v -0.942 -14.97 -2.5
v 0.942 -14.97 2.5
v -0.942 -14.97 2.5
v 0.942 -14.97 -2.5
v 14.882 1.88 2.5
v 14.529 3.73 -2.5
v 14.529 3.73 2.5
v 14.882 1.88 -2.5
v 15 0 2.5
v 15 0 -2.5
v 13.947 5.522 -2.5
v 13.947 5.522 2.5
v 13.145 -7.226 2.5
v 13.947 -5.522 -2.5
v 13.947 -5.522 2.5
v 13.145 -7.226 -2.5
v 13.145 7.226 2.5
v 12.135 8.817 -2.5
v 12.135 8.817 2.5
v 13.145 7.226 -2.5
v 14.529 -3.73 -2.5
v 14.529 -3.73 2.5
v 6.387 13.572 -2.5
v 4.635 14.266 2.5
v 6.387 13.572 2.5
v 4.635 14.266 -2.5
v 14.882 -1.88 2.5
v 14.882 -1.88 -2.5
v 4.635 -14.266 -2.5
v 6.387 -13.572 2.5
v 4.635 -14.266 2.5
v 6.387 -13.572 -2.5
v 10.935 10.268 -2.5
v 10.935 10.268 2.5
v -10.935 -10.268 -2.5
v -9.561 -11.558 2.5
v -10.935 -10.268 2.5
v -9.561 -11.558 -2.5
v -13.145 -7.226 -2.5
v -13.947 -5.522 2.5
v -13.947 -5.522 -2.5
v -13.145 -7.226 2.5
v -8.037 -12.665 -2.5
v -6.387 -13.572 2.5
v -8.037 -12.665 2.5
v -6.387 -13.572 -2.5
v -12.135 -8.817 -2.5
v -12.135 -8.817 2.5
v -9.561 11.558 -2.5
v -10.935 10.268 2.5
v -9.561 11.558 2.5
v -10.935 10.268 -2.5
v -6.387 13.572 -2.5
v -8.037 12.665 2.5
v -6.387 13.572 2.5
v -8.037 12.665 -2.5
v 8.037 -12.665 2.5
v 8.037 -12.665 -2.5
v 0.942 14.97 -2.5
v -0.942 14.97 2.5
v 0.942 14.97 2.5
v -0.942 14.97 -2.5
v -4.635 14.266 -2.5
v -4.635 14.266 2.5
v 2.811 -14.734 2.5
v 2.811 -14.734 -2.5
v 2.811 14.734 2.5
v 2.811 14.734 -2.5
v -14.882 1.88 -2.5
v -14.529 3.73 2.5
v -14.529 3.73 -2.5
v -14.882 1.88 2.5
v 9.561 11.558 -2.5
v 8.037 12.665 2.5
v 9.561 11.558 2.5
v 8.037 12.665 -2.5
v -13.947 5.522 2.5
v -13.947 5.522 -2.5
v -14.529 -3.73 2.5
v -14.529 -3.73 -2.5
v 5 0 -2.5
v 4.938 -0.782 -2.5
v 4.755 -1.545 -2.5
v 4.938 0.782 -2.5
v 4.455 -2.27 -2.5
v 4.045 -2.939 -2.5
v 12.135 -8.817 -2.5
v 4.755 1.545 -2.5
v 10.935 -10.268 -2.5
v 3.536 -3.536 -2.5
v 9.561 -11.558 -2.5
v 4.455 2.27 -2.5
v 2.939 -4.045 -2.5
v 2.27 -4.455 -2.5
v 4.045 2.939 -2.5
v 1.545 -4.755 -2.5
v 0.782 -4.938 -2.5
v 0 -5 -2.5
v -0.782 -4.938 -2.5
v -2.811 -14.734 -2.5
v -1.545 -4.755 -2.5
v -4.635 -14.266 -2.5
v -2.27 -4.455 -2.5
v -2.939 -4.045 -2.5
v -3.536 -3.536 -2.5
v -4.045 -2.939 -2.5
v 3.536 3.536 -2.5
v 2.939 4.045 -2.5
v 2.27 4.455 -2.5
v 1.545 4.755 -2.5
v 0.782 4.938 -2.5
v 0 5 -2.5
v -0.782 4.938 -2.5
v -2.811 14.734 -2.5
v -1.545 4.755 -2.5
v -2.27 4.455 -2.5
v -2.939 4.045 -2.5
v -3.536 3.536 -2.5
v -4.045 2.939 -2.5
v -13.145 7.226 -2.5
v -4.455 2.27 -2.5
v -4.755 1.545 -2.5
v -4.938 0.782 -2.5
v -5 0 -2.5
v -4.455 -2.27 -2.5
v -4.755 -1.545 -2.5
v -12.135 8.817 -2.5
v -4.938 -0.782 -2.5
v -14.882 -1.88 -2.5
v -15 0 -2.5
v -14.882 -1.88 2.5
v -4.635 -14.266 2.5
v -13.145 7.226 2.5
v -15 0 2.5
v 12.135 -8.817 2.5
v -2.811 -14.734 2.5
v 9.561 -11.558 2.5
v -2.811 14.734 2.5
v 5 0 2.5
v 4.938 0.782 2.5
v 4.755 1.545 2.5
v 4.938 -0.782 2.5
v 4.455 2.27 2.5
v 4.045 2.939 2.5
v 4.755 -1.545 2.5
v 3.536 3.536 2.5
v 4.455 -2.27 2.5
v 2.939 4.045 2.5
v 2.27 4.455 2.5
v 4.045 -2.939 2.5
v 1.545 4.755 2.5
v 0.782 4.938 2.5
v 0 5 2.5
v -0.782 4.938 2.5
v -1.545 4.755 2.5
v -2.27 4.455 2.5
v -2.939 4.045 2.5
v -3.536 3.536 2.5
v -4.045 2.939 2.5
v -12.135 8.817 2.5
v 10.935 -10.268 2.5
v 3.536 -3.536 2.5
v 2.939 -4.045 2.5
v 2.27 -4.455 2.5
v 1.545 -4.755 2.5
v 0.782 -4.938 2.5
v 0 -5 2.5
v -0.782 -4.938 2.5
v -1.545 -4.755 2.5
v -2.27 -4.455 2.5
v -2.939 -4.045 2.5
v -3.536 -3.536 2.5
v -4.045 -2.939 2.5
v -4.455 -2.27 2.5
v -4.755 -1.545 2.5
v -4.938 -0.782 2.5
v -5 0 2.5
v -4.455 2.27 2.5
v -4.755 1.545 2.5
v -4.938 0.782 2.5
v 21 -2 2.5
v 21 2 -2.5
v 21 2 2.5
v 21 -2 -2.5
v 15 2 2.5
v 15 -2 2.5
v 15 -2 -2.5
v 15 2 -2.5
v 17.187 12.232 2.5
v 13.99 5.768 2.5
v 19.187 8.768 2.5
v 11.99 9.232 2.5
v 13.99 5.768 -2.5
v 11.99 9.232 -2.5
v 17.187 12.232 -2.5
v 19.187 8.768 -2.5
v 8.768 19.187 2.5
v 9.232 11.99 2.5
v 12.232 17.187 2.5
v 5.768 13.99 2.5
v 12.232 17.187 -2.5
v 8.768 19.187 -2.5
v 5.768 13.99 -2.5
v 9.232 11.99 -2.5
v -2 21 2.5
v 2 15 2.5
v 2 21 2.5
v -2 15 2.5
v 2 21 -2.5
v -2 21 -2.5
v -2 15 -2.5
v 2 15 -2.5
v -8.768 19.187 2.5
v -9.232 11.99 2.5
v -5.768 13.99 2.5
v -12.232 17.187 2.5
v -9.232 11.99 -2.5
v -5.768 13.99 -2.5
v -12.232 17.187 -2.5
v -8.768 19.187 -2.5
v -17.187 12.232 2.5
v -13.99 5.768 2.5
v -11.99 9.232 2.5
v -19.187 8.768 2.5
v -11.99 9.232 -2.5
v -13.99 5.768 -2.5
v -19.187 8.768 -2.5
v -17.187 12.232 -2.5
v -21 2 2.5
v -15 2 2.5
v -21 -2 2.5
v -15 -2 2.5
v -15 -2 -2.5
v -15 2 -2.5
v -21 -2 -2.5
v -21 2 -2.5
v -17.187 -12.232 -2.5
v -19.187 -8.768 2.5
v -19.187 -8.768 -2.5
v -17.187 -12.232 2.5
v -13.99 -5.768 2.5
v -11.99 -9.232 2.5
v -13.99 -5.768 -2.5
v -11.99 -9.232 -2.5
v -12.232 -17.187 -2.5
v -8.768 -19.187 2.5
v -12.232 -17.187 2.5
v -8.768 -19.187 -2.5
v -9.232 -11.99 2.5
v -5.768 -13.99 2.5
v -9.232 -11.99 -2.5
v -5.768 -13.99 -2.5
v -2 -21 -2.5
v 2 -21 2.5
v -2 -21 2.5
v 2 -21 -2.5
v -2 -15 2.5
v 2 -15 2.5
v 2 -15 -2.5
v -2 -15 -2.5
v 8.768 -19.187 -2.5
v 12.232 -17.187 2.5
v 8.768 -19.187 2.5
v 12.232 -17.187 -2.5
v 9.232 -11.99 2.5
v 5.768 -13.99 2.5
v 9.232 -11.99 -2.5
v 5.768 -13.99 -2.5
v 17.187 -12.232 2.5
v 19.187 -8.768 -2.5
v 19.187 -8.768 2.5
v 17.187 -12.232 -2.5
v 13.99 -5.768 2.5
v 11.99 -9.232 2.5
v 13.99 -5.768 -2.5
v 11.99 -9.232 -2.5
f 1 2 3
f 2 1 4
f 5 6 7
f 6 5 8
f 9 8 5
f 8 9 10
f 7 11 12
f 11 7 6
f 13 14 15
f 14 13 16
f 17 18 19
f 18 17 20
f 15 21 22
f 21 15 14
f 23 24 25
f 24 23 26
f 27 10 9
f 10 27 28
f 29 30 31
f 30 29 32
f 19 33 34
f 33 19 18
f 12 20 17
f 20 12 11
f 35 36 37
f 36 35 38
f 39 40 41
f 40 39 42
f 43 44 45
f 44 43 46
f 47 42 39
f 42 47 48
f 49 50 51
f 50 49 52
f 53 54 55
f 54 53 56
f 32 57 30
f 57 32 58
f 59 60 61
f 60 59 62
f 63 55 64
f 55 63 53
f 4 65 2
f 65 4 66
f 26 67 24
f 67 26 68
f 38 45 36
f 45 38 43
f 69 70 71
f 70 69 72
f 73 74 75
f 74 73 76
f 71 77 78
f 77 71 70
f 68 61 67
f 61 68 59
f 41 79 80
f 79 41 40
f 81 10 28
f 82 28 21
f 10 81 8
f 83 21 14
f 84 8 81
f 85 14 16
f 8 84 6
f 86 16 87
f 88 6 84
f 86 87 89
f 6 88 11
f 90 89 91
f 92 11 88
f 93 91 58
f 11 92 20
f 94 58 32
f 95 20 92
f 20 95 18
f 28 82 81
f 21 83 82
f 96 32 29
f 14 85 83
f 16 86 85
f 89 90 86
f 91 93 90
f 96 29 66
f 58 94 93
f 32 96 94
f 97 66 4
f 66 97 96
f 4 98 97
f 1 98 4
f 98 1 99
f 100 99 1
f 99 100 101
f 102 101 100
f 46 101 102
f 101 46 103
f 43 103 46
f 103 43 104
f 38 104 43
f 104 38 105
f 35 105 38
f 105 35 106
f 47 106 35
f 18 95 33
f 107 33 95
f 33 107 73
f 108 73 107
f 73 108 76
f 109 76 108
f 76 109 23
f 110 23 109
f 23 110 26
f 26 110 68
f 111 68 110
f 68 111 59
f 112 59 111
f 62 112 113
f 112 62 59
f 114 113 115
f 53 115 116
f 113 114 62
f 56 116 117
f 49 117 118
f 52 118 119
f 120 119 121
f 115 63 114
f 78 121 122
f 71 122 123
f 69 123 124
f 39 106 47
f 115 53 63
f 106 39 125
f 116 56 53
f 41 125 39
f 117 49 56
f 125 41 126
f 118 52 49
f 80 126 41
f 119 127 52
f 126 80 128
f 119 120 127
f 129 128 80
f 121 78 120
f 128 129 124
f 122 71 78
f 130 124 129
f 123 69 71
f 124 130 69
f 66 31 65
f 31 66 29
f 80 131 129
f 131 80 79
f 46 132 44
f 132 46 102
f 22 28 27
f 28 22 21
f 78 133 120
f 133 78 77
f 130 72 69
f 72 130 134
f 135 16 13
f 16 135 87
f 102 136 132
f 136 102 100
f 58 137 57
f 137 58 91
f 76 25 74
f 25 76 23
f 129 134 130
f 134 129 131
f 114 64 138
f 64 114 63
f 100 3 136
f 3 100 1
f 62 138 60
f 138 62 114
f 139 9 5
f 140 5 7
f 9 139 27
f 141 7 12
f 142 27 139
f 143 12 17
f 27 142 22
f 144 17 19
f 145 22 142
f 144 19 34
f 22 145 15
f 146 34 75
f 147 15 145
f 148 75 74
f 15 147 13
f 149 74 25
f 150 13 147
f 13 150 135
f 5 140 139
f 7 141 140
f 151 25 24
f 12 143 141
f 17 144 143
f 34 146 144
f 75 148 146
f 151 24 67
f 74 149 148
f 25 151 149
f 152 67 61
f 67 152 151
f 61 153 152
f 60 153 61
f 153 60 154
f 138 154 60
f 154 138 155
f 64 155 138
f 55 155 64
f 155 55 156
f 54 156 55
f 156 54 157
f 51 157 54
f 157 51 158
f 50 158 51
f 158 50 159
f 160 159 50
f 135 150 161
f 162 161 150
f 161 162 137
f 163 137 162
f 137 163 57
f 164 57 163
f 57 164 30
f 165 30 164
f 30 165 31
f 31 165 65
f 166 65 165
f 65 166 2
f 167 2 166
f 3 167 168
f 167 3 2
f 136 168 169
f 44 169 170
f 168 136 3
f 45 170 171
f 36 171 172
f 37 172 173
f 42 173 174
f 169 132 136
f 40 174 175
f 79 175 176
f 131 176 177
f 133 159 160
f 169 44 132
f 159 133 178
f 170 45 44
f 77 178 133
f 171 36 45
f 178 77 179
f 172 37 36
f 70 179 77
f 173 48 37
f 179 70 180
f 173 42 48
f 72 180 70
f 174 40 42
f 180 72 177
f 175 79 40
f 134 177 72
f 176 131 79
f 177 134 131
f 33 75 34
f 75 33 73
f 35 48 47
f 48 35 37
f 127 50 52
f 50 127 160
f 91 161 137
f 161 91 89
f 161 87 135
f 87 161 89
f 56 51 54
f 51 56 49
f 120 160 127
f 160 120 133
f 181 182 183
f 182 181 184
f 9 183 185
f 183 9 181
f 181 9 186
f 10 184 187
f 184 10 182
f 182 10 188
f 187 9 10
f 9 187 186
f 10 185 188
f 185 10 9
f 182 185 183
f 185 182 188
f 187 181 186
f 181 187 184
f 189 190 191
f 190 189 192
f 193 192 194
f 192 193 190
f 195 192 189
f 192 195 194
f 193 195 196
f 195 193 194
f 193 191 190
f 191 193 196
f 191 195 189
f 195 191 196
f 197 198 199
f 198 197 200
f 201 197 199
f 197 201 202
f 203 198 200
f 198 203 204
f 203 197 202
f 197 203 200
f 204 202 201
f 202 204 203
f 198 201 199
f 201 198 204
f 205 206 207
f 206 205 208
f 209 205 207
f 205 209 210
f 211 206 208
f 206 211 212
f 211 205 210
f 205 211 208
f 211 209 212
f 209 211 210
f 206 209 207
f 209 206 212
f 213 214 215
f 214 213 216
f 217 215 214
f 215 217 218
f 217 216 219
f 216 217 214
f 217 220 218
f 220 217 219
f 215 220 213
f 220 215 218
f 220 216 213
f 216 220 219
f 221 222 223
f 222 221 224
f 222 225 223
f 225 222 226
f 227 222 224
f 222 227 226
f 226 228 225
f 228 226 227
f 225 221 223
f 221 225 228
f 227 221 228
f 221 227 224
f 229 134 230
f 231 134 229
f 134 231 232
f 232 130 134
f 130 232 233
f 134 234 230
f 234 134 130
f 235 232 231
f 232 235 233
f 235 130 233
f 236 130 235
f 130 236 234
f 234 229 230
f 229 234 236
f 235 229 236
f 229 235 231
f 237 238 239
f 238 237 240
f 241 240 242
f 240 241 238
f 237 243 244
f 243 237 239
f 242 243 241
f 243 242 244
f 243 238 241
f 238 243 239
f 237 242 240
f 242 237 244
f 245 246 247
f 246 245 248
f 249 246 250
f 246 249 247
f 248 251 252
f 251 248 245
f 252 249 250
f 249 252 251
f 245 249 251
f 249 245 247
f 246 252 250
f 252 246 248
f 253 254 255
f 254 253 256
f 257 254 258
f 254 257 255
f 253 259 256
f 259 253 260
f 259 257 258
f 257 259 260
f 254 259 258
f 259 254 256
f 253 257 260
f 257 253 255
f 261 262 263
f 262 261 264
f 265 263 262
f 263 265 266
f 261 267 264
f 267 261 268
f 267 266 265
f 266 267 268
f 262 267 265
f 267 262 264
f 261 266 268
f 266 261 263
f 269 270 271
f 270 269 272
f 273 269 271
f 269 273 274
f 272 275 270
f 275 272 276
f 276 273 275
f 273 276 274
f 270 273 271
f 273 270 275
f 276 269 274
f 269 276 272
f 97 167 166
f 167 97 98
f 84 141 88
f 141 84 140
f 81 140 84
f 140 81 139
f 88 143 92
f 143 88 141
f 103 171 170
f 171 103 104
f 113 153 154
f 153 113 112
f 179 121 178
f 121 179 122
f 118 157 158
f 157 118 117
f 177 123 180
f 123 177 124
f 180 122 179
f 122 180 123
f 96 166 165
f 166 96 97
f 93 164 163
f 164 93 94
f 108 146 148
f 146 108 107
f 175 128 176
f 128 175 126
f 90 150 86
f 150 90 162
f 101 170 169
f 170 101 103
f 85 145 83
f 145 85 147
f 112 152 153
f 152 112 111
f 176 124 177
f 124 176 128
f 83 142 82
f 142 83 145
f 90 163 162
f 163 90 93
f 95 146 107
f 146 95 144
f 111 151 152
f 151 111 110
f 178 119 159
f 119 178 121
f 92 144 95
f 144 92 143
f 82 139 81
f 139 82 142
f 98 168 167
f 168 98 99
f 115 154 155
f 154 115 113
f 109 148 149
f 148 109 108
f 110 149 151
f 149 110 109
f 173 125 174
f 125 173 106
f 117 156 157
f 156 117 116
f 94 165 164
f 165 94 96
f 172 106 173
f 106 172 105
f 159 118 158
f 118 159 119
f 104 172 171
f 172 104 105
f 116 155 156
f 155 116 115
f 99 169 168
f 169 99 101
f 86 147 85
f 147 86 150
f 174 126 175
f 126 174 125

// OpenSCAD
difference() {
	union() {
		cylinder($fn = 50, center = true, h = 5, r = 15);
		rotate(a = [0, 0, 0.0]) {
			translate(v = [18, 0, 0]) {
				cube(center = true, size = [6, 4, 5]);
			}
		}
		rotate(a = [0, 0, 30.0]) {
			translate(v = [18, 0, 0]) {
				cube(center = true, size = [6, 4, 5]);
			}
		}
		rotate(a = [0, 0, 60.0]) {
			translate(v = [18, 0, 0]) {
				cube(center = true, size = [6, 4, 5]);
			}
		}
		rotate(a = [0, 0, 90.0]) {
			translate(v = [18, 0, 0]) {
				cube(center = true, size = [6, 4, 5]);
			}
		}
		rotate(a = [0, 0, 120.0]) {
			translate(v = [18, 0, 0]) {
				cube(center = true, size = [6, 4, 5]);
			}
		}
		rotate(a = [0, 0, 150.0]) {
			translate(v = [18, 0, 0]) {
				cube(center = true, size = [6, 4, 5]);
			}
		}
		rotate(a = [0, 0, 180.0]) {
			translate(v = [18, 0, 0]) {
				cube(center = true, size = [6, 4, 5]);
			}
		}
		rotate(a = [0, 0, 210.0]) {
			translate(v = [18, 0, 0]) {
				cube(center = true, size = [6, 4, 5]);
			}
		}
		rotate(a = [0, 0, 240.0]) {
			translate(v = [18, 0, 0]) {
				cube(center = true, size = [6, 4, 5]);
			}
		}
		rotate(a = [0, 0, 270.0]) {
			translate(v = [18, 0, 0]) {
				cube(center = true, size = [6, 4, 5]);
			}
		}
		rotate(a = [0, 0, 300.0]) {
			translate(v = [18, 0, 0]) {
				cube(center = true, size = [6, 4, 5]);
			}
		}
		rotate(a = [0, 0, 330.0]) {
			translate(v = [18, 0, 0]) {
				cube(center = true, size = [6, 4, 5]);
			}
		}
	}
	cylinder($fn = 40, center = true, h = 6, r = 5);
}
